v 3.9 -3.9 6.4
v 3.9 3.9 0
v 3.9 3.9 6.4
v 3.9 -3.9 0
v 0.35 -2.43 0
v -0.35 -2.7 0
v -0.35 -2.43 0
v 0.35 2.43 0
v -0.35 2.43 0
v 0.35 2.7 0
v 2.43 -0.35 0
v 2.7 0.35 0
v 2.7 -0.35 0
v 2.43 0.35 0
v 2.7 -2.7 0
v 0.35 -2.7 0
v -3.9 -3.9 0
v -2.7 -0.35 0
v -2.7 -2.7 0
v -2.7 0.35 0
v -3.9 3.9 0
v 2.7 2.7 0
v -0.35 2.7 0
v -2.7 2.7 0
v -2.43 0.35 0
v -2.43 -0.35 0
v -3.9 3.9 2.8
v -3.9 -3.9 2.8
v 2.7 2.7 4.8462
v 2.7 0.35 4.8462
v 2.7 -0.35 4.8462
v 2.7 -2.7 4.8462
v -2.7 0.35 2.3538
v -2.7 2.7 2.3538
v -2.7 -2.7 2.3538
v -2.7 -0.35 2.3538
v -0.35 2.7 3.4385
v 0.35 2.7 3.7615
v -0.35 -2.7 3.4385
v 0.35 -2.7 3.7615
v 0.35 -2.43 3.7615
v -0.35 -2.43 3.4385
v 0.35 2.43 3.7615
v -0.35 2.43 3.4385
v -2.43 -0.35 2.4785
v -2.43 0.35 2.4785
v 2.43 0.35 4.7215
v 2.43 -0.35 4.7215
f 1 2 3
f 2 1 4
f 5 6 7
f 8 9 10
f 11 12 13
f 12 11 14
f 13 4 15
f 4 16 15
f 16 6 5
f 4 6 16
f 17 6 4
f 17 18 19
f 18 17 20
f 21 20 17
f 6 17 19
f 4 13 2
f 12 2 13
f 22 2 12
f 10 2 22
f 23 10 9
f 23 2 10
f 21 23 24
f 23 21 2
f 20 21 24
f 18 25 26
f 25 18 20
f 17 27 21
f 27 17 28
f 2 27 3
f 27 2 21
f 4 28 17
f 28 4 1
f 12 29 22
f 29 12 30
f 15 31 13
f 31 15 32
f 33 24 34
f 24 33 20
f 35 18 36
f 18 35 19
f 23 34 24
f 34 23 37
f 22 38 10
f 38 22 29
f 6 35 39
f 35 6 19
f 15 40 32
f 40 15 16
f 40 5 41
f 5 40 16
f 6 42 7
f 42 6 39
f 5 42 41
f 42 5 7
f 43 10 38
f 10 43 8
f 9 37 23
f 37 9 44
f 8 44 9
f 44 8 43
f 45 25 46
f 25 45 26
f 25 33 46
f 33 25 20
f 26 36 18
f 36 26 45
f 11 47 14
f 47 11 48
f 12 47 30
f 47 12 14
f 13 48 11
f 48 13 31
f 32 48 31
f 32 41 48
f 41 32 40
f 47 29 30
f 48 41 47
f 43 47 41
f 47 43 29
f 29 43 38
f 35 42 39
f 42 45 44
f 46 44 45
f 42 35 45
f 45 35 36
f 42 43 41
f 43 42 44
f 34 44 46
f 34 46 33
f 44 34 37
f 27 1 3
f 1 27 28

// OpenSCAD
use <../LEGO.scad>;

block(
    width=1,
    length=1,
    height=2/3,
    type="slope"
);
